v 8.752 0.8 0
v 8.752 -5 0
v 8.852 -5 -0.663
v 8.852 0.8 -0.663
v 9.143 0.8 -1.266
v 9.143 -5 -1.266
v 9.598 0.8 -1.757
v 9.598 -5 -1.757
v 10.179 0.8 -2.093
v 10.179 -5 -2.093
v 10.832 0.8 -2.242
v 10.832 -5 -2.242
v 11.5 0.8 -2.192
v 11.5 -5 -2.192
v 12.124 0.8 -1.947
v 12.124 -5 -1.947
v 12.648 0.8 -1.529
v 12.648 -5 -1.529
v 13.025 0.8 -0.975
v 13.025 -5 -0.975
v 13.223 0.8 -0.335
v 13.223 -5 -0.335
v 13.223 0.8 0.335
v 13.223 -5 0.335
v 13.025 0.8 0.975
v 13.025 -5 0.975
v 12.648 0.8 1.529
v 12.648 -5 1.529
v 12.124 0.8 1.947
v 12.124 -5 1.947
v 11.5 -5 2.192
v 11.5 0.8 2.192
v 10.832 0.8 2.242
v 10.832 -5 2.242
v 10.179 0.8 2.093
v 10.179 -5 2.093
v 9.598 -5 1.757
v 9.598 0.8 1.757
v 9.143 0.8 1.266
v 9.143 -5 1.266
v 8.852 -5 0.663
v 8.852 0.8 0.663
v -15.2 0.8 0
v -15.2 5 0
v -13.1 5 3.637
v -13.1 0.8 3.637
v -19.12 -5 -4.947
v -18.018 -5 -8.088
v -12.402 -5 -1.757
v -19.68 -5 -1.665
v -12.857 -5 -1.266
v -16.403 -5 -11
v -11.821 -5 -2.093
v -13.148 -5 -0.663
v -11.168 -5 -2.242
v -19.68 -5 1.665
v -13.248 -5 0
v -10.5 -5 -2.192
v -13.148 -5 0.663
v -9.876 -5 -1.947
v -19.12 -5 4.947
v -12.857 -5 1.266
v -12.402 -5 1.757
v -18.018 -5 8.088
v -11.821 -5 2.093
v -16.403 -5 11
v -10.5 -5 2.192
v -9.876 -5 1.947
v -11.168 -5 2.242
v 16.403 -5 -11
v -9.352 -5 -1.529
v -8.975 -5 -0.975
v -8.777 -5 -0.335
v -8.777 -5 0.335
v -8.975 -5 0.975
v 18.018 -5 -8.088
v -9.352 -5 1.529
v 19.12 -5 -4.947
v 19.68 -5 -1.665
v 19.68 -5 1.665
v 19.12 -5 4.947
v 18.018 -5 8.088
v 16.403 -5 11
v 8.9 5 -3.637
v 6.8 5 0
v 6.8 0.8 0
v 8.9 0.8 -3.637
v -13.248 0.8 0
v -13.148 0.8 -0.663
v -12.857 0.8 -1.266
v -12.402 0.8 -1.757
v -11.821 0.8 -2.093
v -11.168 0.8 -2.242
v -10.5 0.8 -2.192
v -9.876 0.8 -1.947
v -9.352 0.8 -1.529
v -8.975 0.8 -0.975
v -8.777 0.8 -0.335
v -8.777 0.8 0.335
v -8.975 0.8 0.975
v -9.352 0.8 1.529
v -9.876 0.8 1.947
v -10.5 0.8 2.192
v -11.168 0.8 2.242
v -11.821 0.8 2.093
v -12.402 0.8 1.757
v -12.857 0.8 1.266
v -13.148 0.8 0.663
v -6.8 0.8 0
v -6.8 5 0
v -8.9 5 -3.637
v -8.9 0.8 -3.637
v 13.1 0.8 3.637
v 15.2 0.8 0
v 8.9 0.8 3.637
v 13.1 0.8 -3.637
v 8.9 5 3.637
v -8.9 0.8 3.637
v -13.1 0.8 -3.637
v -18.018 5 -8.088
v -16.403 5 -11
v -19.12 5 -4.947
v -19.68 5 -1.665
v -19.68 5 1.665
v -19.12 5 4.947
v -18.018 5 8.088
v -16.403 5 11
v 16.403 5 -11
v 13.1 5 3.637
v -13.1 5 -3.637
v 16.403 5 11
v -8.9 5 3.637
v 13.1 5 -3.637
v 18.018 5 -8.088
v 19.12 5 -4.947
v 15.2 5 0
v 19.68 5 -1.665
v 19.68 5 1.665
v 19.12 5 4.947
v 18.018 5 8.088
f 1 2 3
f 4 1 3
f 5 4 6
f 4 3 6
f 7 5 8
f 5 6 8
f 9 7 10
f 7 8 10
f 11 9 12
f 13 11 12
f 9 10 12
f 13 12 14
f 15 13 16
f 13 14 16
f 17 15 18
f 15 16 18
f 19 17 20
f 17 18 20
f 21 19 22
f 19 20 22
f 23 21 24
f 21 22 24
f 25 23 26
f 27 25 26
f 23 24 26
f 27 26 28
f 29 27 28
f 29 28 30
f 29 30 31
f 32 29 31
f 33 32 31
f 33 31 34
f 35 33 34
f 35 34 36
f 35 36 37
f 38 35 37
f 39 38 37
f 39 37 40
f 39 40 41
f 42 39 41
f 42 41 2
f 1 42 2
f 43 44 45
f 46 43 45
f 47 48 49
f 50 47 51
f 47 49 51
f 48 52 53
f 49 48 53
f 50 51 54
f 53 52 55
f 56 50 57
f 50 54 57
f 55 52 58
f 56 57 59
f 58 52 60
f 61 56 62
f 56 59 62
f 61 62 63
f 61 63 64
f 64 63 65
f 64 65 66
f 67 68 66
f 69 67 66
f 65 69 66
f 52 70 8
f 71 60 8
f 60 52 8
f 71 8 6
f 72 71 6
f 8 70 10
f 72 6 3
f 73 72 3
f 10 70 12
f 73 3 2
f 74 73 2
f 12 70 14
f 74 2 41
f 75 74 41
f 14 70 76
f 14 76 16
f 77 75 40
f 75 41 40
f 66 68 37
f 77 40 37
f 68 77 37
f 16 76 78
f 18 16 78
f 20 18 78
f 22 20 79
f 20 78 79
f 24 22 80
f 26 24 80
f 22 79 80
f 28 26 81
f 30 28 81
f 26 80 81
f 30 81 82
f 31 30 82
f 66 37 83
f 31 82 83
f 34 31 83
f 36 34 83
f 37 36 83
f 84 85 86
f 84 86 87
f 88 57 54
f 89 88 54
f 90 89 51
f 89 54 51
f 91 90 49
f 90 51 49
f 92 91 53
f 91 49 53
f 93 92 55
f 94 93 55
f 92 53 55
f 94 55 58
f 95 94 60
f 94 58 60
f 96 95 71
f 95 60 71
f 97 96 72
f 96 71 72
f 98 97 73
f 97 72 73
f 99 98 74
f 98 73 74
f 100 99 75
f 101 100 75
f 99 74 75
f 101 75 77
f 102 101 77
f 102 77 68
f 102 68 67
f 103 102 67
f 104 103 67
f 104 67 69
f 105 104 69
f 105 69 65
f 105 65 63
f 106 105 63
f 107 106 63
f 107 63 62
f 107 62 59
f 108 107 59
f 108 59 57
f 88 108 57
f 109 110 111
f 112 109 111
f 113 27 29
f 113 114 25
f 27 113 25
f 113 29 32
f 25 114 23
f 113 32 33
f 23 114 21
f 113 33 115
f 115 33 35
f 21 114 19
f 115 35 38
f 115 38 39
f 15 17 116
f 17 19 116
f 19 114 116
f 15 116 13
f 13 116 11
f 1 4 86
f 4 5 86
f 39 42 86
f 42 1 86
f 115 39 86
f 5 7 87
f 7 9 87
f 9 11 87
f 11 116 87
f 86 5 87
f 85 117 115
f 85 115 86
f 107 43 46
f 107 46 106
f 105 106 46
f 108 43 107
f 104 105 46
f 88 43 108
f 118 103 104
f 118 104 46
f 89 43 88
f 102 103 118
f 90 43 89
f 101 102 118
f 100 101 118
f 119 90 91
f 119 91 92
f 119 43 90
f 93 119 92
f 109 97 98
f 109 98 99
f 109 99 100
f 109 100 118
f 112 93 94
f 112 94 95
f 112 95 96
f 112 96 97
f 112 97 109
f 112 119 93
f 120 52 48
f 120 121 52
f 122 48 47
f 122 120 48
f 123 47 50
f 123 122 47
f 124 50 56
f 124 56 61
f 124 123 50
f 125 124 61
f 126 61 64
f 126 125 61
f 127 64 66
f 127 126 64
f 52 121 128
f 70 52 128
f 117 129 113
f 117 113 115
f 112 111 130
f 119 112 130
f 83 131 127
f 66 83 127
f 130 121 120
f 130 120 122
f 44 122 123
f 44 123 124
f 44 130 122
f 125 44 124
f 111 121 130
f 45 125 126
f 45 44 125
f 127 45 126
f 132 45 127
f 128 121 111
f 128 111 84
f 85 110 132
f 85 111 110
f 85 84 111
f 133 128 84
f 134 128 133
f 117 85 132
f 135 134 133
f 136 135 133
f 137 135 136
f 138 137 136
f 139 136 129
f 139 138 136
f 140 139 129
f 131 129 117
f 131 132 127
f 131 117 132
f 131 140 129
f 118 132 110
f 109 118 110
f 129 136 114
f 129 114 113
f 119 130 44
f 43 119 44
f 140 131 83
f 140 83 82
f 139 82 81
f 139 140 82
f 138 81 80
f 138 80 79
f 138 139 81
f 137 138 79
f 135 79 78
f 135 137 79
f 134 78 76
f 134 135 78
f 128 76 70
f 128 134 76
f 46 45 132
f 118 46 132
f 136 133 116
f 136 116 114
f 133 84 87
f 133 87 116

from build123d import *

# Parameters (mm, degrees)
SKETCH1_R             = 19.75
BOSS_EXTRUDE1_DEPTH   = 5
CUT_EXTRUDE1_DEPTH    = 4.2
F_8_CLEARANCE_HOLE1_D = 4.4958
CUT_EXTRUDE2_DEPTH    = 10


with BuildPart() as part:
    # Sketch1 → Boss-Extrude1 (new, symmetric)
    with BuildSketch(Plane(origin=(0, 0, 0), x_dir=(1, 0, 0), z_dir=(0, 1, 0))):
        Circle(SKETCH1_R)
    extrude(amount=BOSS_EXTRUDE1_DEPTH, both=True)

    # Sketch2 → Cut-Extrude1 (cut)
    with BuildSketch(Plane(origin=(0, 5, 0), x_dir=(1, 0, 0), z_dir=(0, 1, 0))):
        Polygon((-8.9, -3.637306696), (-6.8, 0), (-8.9, 3.637306696), (-13.1, 3.637306696), (-15.2, 0), (-13.1, -3.637306696), align=None)
        Polygon((13.1, -3.637306696), (8.9, -3.637306696), (6.8, 0), (8.9, 3.637306696), (13.1, 3.637306696), (15.2, 0), align=None)
    extrude(amount=-CUT_EXTRUDE1_DEPTH, mode=Mode.SUBTRACT)

    # #8 Clearance Hole1 (through all)
    with Locations(Plane(origin=(0, 0.8, 0), x_dir=(1, 0, 0), z_dir=(0, 1, 0))):
        with Locations((-11, 0), (11, 0)):
            Hole(F_8_CLEARANCE_HOLE1_D / 2)

    # Sketch6 → Cut-Extrude2 (cut)
    with BuildSketch(Plane(origin=(0, 5, 0), x_dir=(1, 0, 0), z_dir=(0, 1, 0))):
        with BuildLine():
            ThreePointArc((16.403124702, 11), (0, 19.75), (-16.403124702, 11))
            Line((-16.403124702, 11), (16.403124702, 11))
        make_face()
        with BuildLine():
            Line((16.403124702, -11), (-16.403124702, -11))
            ThreePointArc((-16.403124702, -11), (0, -19.75), (16.403124702, -11))
        make_face()
    extrude(amount=-CUT_EXTRUDE2_DEPTH, mode=Mode.SUBTRACT)


solid = part.part
